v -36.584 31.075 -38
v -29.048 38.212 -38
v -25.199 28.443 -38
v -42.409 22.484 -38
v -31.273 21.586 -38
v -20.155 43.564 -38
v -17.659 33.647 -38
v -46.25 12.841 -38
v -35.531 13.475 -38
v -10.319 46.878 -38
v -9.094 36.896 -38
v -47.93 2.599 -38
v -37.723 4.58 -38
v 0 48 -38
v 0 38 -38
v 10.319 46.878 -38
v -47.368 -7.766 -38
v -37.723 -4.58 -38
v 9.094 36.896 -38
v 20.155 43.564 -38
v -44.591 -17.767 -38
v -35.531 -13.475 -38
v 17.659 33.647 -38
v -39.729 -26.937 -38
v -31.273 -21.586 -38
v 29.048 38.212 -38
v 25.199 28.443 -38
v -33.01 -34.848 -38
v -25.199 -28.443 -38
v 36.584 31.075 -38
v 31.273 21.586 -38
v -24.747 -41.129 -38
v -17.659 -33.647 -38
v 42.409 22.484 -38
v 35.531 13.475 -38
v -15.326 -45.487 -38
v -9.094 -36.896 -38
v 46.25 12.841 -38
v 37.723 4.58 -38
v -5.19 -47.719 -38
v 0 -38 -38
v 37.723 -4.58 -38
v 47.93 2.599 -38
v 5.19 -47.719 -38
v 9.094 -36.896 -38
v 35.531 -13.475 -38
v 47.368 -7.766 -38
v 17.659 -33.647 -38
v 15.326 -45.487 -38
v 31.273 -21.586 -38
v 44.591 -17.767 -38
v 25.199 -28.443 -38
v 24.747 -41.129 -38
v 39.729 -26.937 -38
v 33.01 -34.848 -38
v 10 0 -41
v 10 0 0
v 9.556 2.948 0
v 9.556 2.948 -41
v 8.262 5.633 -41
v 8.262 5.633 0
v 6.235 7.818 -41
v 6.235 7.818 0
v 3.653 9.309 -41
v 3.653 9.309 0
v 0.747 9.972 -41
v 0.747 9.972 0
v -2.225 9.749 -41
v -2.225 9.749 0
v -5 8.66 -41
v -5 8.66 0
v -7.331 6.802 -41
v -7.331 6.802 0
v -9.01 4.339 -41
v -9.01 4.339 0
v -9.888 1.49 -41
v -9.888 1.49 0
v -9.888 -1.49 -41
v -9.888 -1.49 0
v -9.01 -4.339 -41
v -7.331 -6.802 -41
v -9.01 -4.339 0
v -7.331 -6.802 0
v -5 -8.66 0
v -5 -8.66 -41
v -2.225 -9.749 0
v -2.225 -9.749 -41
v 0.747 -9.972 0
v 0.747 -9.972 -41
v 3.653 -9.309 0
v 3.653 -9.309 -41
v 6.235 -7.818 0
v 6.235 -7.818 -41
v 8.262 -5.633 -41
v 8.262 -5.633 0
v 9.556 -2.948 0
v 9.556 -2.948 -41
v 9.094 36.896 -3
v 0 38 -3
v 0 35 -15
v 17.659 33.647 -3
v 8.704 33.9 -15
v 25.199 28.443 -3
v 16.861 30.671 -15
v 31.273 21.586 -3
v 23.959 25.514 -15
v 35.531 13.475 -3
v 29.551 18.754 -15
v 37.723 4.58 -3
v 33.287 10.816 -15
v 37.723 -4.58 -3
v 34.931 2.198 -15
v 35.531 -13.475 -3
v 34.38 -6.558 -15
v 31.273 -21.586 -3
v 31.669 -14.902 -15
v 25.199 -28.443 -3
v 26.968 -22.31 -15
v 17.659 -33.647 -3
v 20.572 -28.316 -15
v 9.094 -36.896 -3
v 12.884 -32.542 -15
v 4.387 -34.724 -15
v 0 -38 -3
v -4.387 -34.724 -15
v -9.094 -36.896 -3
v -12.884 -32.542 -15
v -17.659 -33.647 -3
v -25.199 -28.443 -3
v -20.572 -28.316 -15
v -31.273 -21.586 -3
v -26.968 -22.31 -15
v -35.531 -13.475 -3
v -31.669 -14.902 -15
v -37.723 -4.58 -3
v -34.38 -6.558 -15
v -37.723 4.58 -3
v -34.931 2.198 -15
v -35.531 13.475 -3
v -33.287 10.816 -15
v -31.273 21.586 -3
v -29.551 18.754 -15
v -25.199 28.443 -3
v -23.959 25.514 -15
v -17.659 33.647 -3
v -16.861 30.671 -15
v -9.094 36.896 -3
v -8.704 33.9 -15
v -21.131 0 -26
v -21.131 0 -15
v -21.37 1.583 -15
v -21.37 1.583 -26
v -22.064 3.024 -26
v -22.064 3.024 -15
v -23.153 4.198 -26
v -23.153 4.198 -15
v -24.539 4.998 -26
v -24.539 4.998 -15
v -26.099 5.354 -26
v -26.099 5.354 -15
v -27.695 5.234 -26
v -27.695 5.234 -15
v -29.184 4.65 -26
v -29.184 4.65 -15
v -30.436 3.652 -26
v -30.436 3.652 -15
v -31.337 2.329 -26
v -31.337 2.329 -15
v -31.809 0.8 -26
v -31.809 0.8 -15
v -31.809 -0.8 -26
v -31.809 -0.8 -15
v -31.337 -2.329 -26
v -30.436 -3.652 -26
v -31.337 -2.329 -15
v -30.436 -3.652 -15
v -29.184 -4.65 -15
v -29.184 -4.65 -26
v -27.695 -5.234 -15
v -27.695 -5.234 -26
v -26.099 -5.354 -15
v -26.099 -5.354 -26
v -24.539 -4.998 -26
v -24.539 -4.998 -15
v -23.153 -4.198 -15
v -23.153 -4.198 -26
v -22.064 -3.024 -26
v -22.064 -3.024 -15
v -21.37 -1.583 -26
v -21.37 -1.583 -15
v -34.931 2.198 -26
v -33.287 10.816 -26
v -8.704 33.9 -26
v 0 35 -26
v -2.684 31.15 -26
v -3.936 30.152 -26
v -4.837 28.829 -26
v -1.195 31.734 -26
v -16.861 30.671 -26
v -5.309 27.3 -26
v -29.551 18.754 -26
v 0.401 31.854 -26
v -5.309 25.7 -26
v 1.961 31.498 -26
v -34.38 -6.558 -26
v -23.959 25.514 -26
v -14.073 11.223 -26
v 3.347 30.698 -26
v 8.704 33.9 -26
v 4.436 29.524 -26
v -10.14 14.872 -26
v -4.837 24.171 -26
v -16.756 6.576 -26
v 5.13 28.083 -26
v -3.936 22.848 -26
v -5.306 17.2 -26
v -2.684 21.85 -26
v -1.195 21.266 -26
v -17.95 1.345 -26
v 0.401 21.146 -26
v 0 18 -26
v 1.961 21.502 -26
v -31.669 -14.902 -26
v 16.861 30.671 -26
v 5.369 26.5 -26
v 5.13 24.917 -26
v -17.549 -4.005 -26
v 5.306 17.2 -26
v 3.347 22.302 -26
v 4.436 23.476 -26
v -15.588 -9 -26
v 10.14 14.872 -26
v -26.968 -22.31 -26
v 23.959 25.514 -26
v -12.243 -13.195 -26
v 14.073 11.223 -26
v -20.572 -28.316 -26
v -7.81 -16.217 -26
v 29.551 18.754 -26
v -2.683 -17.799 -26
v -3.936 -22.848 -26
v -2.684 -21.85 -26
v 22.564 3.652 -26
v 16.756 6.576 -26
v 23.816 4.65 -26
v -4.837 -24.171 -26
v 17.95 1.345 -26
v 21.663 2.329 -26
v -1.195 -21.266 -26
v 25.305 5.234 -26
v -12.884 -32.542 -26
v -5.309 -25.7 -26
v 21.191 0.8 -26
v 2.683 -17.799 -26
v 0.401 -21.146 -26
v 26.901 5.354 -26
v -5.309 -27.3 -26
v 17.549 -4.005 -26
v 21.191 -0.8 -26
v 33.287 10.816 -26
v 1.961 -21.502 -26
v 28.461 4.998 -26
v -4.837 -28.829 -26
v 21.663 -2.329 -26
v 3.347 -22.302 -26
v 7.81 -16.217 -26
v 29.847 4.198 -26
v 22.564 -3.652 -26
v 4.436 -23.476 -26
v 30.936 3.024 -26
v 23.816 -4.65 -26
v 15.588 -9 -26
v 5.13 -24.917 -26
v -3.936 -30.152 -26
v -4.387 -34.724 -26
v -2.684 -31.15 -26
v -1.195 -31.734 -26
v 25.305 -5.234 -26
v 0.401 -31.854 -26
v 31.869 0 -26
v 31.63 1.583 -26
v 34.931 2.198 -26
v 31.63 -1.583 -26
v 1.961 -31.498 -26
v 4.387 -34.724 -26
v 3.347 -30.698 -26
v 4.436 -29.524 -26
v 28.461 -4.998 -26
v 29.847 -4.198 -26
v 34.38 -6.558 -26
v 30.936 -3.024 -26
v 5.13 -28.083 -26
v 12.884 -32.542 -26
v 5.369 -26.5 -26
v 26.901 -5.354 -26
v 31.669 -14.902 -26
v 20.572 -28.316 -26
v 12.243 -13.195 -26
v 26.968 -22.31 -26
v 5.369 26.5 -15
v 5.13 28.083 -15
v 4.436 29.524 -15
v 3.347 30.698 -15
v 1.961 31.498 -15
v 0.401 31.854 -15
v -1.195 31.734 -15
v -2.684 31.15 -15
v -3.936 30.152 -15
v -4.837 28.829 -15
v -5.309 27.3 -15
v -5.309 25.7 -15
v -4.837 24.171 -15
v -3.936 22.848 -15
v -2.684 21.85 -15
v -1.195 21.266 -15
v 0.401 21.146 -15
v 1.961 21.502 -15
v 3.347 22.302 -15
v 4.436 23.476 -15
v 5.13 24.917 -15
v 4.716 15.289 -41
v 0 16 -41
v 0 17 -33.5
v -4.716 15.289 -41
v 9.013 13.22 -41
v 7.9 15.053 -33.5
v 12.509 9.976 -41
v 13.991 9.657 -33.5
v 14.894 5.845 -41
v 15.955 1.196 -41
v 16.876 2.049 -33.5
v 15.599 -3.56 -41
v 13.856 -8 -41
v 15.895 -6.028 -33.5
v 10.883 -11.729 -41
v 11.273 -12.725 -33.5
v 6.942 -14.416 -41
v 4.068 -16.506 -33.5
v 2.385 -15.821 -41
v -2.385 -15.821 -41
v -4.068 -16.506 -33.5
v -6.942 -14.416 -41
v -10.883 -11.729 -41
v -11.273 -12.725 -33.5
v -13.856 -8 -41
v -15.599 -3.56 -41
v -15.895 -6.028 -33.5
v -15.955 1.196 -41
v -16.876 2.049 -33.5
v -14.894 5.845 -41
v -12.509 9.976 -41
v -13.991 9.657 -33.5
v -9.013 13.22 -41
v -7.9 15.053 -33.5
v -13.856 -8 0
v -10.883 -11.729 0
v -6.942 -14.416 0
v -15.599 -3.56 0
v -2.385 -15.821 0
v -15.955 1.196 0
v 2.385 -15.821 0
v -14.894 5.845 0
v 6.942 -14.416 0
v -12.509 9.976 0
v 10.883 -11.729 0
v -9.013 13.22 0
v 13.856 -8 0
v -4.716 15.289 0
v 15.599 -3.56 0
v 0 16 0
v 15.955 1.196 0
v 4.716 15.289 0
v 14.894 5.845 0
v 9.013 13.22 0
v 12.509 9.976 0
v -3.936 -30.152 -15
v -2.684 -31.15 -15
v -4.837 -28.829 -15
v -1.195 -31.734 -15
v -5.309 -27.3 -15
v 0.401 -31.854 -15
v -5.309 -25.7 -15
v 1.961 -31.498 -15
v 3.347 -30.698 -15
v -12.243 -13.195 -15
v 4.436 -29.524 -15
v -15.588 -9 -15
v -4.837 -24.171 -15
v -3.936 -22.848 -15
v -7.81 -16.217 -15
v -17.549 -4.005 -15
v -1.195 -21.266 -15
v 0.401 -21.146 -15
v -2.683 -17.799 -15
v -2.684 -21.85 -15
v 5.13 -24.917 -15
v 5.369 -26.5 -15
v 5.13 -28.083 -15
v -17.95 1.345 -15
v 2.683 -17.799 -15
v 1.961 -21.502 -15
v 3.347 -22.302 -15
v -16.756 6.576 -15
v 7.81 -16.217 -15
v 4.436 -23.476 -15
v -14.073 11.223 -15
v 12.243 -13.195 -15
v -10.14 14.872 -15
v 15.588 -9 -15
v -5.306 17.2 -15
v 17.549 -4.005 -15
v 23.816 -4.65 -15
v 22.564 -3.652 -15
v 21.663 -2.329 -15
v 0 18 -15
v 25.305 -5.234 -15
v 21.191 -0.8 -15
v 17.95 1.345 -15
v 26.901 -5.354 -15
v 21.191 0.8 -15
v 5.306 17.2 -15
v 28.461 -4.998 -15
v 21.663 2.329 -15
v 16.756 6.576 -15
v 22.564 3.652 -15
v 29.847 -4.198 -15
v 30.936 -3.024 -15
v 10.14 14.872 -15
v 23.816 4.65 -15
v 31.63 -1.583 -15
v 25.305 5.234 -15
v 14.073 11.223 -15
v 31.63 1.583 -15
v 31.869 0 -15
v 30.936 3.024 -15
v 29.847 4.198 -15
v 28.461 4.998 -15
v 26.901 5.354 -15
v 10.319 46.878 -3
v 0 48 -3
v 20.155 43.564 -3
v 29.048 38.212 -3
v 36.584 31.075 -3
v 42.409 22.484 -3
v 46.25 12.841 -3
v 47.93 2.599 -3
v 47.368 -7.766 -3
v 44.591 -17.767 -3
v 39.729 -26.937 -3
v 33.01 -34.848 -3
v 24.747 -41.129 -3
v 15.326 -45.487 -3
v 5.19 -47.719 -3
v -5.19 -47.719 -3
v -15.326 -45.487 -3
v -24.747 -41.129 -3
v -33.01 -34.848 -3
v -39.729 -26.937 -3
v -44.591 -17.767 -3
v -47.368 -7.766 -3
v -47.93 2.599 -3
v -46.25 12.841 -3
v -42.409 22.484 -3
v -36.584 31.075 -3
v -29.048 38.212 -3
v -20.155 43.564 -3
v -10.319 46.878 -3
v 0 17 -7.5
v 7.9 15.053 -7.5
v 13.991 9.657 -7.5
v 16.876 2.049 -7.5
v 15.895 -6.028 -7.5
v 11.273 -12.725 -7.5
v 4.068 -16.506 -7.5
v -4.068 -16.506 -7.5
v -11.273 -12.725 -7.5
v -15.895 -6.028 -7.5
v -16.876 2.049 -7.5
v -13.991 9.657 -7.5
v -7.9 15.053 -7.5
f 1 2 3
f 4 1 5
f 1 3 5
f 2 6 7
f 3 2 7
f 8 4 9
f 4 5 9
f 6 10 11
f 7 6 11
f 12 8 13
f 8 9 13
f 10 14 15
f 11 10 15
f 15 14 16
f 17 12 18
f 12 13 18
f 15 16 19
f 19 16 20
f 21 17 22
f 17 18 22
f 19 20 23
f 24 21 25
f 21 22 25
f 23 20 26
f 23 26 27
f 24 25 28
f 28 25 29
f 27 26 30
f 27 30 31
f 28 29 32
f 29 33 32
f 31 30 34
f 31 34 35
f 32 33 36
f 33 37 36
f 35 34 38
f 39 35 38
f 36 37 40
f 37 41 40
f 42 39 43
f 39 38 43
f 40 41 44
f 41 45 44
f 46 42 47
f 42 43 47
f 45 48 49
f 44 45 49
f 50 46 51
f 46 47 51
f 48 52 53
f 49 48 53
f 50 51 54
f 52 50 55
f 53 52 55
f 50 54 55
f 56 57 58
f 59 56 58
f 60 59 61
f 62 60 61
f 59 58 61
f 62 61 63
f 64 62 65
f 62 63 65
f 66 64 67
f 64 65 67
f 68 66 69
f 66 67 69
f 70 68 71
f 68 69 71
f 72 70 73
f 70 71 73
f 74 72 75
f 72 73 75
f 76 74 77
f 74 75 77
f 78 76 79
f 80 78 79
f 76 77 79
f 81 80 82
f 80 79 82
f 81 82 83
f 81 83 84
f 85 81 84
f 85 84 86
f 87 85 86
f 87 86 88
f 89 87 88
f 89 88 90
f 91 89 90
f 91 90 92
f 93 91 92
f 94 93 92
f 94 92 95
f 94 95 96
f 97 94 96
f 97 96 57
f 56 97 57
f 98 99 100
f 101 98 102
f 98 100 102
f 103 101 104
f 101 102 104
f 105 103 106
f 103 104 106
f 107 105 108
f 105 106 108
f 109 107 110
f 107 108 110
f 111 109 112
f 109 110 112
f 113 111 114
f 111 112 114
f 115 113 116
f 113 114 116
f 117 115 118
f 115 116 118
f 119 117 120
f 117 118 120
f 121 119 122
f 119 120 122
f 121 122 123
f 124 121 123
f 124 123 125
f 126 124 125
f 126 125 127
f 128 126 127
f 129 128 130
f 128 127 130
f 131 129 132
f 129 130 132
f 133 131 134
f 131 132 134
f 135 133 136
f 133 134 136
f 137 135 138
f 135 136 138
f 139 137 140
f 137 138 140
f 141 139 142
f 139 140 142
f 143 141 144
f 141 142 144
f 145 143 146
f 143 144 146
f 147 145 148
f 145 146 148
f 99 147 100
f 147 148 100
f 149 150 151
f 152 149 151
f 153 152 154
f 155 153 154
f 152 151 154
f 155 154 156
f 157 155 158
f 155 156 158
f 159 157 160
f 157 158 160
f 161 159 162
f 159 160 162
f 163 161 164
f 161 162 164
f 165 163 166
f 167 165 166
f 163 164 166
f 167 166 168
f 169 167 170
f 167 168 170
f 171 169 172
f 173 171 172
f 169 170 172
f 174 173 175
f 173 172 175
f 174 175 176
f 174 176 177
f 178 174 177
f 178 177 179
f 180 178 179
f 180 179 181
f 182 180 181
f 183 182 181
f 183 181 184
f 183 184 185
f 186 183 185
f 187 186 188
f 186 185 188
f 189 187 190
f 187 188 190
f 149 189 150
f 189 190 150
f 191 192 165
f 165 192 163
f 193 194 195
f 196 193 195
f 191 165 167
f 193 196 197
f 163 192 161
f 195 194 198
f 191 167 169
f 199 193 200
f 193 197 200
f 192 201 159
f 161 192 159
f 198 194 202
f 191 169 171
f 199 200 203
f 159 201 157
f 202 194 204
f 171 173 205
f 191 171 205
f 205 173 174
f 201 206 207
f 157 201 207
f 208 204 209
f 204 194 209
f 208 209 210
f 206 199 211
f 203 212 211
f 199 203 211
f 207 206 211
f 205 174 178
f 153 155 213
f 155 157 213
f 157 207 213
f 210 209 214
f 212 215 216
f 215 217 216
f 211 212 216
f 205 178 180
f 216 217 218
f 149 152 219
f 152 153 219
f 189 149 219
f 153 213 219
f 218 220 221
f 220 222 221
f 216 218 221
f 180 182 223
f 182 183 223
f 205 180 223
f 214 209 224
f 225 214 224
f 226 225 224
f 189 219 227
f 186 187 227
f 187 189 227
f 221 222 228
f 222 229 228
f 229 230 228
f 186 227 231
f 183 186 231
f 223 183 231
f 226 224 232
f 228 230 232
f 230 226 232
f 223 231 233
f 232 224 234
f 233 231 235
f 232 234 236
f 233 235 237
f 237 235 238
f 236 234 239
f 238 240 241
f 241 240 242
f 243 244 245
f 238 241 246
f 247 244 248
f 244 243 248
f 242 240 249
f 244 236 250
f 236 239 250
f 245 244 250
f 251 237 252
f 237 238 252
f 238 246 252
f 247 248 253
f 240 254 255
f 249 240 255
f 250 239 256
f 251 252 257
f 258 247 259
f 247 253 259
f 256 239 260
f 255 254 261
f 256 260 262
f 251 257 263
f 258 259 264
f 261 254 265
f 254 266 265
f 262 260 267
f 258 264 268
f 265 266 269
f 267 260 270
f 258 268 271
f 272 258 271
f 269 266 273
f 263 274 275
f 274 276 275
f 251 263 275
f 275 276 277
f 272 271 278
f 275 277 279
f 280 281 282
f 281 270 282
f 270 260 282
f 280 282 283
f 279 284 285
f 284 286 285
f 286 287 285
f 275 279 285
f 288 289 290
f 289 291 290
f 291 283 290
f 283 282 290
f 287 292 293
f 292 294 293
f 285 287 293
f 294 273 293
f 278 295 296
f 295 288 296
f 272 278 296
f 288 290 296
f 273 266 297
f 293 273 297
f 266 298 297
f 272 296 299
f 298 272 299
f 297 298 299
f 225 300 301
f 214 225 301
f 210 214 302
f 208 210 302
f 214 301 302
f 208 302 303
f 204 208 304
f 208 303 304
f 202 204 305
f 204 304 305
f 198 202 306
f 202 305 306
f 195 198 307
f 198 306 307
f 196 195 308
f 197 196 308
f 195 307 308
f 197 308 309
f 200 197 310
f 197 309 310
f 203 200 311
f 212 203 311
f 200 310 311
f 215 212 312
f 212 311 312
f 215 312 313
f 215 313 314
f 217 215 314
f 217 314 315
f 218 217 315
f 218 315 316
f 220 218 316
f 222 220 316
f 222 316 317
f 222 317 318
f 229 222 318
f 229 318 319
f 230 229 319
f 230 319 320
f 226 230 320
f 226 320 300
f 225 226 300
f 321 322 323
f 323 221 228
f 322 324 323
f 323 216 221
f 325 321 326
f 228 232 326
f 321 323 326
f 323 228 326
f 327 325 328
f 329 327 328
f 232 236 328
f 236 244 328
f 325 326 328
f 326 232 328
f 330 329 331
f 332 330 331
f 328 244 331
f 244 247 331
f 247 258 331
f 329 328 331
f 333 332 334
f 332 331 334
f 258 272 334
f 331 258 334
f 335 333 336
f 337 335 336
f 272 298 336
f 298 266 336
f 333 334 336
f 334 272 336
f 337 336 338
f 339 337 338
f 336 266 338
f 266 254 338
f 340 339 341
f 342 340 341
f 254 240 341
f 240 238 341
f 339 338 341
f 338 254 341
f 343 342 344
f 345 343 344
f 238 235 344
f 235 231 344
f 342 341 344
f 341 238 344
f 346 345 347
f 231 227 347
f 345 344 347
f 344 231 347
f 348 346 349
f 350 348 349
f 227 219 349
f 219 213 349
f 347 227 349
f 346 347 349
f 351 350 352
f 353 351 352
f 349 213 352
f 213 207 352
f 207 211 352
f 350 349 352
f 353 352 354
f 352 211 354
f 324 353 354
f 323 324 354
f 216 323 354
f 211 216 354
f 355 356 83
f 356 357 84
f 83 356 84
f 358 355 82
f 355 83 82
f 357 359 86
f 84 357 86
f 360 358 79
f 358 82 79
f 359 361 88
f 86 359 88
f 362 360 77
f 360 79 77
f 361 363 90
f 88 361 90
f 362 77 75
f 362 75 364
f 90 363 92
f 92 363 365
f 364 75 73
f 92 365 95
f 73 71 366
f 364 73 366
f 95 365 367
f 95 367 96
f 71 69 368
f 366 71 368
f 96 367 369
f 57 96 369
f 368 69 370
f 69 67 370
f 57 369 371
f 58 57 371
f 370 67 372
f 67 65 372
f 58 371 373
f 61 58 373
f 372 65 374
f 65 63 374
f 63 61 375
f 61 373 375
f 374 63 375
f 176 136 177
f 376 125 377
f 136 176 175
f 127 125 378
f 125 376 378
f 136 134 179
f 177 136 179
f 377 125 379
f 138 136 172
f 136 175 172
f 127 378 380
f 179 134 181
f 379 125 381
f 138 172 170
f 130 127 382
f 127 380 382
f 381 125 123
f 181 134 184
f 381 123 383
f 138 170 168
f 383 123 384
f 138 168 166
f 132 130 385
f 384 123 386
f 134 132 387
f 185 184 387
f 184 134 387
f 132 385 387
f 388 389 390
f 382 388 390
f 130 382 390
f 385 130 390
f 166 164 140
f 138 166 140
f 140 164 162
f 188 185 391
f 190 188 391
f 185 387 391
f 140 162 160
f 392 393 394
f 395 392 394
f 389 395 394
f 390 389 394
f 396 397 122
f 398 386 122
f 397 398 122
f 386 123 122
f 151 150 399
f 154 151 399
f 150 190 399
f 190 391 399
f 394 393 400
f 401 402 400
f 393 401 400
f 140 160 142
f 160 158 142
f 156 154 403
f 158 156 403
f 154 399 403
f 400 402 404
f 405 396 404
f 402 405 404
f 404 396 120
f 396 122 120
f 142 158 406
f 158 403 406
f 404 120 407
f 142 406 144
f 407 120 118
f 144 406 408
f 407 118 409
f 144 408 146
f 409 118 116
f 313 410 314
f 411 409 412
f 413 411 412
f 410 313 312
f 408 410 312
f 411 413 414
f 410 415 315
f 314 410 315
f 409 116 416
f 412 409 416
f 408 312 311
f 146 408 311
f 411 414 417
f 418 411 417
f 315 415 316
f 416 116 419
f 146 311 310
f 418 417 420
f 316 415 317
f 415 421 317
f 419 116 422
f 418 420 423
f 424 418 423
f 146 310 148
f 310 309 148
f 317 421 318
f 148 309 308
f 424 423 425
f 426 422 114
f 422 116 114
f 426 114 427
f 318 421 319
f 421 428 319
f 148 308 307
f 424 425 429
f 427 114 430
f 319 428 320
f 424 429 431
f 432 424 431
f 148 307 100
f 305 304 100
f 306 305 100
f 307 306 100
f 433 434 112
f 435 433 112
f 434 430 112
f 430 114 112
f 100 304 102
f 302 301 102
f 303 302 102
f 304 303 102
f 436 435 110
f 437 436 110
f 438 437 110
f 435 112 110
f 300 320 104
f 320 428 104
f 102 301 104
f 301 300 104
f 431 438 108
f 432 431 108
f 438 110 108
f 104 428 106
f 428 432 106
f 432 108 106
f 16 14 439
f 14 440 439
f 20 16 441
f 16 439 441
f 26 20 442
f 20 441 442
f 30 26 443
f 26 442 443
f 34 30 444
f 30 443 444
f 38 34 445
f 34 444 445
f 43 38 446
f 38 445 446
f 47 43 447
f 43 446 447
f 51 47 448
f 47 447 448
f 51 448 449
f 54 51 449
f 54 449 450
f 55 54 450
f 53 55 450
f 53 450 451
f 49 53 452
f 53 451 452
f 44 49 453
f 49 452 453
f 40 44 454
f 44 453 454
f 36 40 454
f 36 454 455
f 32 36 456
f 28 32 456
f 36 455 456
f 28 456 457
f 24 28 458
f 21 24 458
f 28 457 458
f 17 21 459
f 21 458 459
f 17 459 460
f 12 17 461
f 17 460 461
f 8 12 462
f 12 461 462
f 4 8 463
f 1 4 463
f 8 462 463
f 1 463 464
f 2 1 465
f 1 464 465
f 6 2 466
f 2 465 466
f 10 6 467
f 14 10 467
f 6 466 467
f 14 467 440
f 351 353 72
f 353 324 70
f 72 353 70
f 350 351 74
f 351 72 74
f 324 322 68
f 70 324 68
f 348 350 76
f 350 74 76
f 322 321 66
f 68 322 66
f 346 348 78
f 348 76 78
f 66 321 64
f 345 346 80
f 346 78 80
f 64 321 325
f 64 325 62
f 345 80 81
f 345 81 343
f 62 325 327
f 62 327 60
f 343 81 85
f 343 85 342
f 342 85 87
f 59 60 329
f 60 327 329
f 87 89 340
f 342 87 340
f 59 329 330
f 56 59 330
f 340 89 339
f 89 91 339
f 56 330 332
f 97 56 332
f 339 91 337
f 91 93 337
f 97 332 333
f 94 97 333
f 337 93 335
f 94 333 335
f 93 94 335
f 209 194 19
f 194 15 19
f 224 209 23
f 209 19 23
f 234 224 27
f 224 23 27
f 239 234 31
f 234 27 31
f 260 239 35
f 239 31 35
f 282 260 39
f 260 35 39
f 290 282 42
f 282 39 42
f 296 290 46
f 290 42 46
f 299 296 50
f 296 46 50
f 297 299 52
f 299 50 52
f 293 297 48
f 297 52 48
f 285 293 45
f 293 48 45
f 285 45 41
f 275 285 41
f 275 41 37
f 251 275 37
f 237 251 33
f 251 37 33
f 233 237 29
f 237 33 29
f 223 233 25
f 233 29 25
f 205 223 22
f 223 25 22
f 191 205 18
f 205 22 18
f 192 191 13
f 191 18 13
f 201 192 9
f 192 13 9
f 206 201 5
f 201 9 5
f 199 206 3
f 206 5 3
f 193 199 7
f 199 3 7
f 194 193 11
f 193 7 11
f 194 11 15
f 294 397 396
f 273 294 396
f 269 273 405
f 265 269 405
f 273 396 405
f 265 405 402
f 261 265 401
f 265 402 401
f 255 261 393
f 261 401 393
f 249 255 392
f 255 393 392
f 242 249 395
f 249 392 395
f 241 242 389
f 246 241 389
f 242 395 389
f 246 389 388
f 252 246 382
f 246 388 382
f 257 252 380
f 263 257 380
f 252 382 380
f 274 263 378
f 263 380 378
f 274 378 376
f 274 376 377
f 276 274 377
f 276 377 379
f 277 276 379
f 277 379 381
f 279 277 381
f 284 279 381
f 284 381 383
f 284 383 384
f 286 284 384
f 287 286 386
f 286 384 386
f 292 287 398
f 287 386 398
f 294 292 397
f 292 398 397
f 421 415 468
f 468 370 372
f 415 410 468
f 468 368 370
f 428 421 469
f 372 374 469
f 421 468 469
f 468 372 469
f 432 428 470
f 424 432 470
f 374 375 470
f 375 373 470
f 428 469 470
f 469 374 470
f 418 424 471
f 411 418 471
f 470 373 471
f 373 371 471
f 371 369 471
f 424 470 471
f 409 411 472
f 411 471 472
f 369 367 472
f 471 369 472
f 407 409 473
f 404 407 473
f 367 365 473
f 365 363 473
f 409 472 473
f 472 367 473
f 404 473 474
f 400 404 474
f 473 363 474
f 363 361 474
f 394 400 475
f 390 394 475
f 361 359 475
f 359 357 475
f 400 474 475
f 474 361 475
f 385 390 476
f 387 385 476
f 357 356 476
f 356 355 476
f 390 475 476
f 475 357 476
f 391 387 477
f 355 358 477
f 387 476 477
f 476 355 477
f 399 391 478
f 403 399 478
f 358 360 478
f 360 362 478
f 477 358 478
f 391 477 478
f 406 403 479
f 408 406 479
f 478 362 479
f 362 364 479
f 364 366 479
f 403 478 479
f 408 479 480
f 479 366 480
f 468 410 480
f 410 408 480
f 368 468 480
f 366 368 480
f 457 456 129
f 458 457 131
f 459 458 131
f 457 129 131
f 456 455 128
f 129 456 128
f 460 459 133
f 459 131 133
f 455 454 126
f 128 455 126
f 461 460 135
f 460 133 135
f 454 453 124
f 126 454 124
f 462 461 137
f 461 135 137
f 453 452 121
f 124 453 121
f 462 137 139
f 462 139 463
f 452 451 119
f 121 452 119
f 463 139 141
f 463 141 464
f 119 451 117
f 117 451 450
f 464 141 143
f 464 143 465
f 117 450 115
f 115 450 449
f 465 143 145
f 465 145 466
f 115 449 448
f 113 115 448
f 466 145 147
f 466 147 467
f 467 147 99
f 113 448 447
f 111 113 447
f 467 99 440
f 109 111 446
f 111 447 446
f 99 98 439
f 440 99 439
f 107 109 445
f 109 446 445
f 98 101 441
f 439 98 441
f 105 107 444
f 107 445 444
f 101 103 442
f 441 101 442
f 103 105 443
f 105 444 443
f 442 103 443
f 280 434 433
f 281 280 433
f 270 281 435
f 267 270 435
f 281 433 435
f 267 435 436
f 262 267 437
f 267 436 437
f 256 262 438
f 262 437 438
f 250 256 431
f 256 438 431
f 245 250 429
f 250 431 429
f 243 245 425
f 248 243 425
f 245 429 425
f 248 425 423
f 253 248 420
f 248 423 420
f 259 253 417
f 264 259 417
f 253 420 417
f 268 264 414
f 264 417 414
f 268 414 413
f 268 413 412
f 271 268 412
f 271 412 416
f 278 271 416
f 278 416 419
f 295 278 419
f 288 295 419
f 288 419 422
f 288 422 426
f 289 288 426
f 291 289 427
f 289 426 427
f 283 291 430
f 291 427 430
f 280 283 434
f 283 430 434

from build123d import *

# Parameters (mm, degrees)
CUT_EXTRUDE1_REACH = 43
SKETCH2_R          = 10
CUT_EXTRUDE2_REACH = 28
SKETCH3_R          = 5.368889336
SKETCH3_4_R        = 5.368889336
CUT_EXTRUDE3_DEPTH = 11


with BuildPart() as part:
    # Sketch1 → Revolve1 (revolve)
    with BuildSketch(Plane(origin=(0, 0, 0), x_dir=(0, 0, -1), z_dir=(1, 0, 0))):
        Polygon((0, 0), (41, 0), (41, 16), (26, 18), (26, 35), (38, 38), (38, 48), (3, 48), (3, 38), (15, 35), (15, 18), (0, 16), align=None)
    revolve(axis=Axis((0, 0, 0), (0, 0, -1)))

    # Sketch2 → Cut-Extrude1 (cut, up to next)
    with BuildSketch(Plane.XY, mode=Mode.PRIVATE) as cut_extrude1_sk1:
        Circle(SKETCH2_R)
    cut_extrude1_tool1 = extrude(cut_extrude1_sk1.sketch, amount=-CUT_EXTRUDE1_REACH, mode=Mode.PRIVATE) & part.part
    add(cut_extrude1_tool1.solids().sort_by_distance((0, 0, 0))[0], mode=Mode.SUBTRACT)

    # Sketch3 → Cut-Extrude2 (cut, up to next)
    with BuildSketch(Plane.XY.offset(-15), mode=Mode.PRIVATE) as cut_extrude2_sk1:
        with Locations((0, 26.5)):
            Circle(SKETCH3_R)
    cut_extrude2_tool1 = extrude(cut_extrude2_sk1.sketch, amount=-CUT_EXTRUDE2_REACH, mode=Mode.PRIVATE) & part.part
    add(cut_extrude2_tool1.solids().sort_by_distance((0, 26.5, -15))[0], mode=Mode.SUBTRACT)

    # Sketch3<4> → Cut-Extrude3 (cut)
    with BuildSketch(Plane.XY.offset(-15)):
        with Locations((0, 26.5)):
            Circle(SKETCH3_4_R)
        with Locations((26.5, 0)):
            Circle(SKETCH3_4_R)
        with Locations((0, -26.5)):
            Circle(SKETCH3_4_R)
        with Locations((-26.5, 0)):
            Circle(SKETCH3_4_R)
    extrude(amount=-CUT_EXTRUDE3_DEPTH, mode=Mode.SUBTRACT)


solid = part.part
